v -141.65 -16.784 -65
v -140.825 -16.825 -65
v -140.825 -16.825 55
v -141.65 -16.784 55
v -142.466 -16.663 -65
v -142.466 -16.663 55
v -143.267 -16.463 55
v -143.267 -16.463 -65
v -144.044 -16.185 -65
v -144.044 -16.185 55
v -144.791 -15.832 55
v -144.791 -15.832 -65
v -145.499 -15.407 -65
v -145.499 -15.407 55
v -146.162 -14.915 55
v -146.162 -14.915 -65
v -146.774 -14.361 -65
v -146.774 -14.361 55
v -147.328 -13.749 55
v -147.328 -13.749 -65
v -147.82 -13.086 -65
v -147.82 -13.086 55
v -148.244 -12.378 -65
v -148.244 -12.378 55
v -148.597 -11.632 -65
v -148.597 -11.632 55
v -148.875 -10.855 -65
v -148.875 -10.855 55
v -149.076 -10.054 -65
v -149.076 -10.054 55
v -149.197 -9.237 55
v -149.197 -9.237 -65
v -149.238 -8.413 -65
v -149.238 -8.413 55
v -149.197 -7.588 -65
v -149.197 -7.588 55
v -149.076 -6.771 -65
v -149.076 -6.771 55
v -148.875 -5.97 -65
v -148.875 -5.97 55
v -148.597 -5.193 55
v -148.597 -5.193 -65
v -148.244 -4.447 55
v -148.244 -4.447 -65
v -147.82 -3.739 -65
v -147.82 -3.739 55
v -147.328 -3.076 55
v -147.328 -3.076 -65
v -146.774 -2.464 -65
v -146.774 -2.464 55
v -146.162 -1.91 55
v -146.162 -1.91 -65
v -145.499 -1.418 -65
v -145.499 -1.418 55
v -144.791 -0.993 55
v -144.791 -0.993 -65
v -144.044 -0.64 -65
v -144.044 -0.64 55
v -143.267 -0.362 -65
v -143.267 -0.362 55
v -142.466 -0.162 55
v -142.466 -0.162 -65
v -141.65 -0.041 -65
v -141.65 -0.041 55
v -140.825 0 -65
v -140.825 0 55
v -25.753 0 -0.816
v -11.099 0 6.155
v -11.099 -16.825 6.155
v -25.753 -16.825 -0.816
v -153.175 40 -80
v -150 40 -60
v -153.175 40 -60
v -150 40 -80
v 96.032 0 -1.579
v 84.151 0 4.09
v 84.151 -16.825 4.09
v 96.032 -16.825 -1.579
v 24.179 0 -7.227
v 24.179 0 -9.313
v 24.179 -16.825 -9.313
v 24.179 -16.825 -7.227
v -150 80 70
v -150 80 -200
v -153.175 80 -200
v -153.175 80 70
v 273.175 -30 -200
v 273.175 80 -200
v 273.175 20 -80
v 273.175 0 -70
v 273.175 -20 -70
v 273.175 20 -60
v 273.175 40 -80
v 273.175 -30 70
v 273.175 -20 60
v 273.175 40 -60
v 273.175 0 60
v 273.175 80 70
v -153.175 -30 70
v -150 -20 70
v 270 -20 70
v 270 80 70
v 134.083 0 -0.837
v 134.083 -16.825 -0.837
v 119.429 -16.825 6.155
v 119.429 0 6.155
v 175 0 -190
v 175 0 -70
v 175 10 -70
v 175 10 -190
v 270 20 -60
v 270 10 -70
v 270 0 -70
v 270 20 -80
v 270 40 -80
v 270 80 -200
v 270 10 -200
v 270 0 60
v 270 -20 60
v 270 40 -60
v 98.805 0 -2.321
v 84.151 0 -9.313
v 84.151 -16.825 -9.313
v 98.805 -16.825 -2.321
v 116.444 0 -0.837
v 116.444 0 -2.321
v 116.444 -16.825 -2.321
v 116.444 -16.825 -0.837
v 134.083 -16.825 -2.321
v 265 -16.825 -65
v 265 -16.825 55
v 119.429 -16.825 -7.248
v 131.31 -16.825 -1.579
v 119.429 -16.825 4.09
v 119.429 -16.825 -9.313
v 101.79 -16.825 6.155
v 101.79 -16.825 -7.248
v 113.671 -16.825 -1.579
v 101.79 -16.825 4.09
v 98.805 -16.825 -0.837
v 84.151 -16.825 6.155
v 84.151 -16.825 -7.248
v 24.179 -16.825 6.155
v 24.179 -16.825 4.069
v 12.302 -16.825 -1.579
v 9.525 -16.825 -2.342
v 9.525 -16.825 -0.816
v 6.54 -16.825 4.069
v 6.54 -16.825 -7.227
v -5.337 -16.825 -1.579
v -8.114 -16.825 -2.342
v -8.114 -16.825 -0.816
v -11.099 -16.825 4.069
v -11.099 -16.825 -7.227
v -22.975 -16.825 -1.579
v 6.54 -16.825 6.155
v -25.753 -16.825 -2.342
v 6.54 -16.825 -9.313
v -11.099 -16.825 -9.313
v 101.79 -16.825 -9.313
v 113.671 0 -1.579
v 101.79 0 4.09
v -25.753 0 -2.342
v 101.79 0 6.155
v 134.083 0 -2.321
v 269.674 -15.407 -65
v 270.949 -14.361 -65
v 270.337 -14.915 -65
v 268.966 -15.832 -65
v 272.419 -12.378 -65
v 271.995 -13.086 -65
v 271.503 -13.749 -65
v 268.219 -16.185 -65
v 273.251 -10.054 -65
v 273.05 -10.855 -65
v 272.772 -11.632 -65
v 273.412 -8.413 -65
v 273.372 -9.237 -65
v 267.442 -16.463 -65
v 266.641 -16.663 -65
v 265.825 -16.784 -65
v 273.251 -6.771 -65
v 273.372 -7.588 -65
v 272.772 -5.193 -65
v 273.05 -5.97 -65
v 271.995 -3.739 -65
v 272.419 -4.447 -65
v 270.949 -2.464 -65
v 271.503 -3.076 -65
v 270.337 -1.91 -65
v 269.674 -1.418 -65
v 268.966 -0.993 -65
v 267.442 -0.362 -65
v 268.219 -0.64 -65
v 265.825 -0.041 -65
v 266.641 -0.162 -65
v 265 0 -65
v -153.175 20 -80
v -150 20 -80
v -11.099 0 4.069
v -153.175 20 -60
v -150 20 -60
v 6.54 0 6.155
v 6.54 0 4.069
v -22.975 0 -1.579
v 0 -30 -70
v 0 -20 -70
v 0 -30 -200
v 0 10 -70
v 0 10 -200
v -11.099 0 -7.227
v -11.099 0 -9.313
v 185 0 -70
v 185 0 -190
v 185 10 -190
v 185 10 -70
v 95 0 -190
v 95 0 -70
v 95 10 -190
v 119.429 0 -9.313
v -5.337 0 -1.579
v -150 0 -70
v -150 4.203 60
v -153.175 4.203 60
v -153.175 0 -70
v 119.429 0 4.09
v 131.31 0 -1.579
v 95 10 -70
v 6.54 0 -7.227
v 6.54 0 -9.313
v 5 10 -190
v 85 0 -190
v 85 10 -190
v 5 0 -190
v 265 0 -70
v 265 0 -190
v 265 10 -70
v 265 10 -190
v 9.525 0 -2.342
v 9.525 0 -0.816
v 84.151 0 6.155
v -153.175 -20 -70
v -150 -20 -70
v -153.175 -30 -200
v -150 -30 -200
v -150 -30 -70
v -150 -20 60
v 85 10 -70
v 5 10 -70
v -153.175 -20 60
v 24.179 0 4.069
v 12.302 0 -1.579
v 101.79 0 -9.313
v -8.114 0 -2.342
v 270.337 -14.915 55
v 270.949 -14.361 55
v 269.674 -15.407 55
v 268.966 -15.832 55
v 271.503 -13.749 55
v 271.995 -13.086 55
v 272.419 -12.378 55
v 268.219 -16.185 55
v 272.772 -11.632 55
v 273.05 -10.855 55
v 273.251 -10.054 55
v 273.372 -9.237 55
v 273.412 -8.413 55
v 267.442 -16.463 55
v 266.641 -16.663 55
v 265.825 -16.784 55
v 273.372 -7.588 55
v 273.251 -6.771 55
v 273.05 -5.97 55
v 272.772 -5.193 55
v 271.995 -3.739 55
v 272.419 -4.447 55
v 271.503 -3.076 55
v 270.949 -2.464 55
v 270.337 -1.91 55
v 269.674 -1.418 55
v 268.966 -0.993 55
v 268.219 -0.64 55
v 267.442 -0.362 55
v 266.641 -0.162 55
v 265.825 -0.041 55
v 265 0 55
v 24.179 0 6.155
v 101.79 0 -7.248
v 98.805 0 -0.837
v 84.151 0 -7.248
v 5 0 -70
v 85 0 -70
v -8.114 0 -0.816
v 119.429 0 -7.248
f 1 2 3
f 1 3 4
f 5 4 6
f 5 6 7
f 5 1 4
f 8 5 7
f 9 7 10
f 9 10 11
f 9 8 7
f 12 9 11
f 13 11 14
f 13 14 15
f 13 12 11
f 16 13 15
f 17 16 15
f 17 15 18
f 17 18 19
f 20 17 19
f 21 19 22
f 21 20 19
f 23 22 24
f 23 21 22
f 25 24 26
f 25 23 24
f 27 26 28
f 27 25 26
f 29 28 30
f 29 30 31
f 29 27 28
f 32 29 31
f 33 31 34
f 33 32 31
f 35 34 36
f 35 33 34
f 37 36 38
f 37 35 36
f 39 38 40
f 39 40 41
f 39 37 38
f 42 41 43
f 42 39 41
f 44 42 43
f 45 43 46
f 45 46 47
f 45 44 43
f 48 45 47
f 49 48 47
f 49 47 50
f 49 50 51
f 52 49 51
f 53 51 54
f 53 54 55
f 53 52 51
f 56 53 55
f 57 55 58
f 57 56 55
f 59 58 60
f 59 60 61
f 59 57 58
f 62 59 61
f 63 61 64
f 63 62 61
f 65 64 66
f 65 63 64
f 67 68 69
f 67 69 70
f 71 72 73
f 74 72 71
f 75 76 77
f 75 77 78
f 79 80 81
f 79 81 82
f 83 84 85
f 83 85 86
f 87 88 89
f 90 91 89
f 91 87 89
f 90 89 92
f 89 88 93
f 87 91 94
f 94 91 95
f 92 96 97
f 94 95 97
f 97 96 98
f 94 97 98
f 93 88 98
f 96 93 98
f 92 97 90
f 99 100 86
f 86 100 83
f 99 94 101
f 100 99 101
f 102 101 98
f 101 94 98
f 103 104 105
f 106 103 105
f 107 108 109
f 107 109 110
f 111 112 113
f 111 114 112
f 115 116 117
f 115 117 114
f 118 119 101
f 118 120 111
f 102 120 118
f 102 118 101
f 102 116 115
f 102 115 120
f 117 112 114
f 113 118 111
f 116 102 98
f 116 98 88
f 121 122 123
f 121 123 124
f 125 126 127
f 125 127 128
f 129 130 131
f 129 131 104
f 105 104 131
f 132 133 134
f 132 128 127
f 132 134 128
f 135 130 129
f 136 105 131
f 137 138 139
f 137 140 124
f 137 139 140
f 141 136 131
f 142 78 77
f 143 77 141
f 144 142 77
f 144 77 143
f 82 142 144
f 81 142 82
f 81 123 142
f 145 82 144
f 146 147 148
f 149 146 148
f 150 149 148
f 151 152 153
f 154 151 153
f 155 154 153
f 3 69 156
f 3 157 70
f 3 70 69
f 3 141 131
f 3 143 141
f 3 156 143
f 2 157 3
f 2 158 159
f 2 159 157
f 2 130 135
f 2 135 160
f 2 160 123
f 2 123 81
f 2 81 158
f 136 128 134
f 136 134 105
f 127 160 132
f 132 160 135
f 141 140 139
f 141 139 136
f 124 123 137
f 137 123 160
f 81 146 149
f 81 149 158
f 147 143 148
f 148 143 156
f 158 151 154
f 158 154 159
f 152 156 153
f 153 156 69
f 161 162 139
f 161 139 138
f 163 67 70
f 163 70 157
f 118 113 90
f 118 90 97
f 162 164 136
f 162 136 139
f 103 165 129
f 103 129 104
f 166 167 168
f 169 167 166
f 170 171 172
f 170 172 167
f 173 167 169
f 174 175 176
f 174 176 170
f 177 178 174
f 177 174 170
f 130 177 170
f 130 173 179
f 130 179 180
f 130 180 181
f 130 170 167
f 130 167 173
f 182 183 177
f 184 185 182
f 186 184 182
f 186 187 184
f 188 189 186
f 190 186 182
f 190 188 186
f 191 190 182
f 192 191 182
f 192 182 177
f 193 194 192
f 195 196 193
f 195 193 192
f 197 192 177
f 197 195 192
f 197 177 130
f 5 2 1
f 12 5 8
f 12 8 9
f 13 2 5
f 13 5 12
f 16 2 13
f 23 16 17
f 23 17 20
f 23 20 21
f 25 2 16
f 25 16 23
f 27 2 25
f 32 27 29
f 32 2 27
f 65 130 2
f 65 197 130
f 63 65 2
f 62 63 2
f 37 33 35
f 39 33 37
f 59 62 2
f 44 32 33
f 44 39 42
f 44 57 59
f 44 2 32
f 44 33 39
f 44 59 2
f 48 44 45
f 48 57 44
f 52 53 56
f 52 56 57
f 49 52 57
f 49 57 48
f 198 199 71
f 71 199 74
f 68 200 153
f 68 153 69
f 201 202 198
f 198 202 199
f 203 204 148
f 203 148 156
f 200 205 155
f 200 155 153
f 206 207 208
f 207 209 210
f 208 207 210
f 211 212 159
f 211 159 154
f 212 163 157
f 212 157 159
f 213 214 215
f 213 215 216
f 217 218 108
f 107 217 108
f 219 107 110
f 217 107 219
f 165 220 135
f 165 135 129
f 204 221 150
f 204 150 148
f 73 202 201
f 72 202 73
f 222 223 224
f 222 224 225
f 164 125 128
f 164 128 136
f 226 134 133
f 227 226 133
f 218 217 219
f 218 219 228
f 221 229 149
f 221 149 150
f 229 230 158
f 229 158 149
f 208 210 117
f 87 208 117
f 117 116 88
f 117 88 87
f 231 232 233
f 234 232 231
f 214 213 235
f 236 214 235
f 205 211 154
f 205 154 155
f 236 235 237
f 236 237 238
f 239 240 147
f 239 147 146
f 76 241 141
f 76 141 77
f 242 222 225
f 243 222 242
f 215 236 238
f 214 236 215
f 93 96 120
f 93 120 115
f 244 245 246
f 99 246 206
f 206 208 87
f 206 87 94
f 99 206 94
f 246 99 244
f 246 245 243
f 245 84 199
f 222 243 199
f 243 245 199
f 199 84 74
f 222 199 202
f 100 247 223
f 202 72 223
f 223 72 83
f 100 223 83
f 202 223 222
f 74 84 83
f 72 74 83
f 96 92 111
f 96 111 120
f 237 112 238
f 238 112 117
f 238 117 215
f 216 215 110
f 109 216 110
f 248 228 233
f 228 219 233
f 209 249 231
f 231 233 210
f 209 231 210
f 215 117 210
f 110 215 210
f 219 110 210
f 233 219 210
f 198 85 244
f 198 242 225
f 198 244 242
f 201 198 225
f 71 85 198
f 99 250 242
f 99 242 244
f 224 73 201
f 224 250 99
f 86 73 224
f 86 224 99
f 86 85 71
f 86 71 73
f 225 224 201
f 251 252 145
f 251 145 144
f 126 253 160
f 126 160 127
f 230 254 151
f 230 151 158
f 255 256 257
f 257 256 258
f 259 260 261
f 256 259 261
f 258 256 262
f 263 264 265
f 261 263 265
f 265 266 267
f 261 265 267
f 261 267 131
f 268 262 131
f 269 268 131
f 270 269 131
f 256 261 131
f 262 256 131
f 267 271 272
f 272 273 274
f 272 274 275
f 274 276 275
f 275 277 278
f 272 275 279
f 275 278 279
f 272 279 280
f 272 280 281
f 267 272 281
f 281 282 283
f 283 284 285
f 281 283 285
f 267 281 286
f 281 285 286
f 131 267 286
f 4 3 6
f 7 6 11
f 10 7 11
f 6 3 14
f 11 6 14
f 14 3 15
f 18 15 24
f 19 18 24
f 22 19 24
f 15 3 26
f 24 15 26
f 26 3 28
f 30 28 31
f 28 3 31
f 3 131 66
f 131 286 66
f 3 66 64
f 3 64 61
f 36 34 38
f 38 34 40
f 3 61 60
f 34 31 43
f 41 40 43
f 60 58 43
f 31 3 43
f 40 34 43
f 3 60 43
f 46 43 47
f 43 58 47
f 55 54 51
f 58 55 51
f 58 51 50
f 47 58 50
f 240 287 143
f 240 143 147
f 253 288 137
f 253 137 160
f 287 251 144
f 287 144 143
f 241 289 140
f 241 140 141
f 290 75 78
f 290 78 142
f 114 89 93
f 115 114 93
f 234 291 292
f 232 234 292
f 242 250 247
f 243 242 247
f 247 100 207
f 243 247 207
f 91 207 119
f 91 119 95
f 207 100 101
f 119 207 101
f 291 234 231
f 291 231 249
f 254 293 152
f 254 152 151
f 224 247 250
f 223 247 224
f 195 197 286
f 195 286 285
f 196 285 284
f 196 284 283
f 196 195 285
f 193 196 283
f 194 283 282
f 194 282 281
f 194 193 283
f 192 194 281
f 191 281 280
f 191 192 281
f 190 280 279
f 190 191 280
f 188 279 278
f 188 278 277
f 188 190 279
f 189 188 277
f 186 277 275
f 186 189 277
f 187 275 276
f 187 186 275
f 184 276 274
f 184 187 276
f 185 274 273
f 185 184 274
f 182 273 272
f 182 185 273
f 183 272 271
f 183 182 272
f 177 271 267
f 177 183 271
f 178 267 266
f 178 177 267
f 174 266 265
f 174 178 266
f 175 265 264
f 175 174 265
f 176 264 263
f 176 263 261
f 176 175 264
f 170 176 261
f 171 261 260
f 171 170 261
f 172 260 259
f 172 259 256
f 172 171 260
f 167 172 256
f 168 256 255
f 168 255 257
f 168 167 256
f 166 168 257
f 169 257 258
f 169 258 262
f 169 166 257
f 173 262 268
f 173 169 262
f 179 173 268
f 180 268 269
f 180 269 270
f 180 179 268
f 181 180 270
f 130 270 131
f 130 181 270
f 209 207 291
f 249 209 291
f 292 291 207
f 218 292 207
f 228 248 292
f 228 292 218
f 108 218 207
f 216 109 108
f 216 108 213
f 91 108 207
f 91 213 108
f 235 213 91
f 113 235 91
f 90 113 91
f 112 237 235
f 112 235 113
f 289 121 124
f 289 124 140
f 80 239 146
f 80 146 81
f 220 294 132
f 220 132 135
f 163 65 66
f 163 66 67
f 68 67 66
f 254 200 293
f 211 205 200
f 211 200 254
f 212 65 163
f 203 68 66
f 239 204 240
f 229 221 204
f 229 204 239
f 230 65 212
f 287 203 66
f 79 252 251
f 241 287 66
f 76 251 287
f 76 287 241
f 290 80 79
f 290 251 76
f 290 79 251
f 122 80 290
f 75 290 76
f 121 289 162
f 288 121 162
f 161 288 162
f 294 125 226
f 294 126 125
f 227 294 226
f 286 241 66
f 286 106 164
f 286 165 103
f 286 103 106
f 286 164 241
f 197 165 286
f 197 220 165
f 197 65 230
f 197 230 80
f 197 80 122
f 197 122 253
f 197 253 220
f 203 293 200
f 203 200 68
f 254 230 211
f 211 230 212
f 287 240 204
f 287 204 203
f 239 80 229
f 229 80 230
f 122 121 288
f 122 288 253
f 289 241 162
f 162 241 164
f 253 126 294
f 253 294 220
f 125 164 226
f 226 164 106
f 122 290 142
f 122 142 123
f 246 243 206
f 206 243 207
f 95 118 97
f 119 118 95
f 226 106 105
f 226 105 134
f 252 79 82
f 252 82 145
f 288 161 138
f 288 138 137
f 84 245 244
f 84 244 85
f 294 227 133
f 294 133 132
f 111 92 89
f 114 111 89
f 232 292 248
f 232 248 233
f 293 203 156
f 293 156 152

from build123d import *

# Parameters (mm, degrees)
PARKING_DEPTH       = 10
PARKINGS_COUNT      = 3
PARKINGS_PITCH      = 90
RIGHTWALL_DEPTH     = 3.175
SKETCH5_W           = 270
SKETCH5_H           = 130
PARKINGBOTTOM_DEPTH = 20
BELT_DEPTH          = 120
SIGN_DEPTH          = 16.825
FLOORBASE_DEPTH     = 10
SKETCH19_W          = 270
SKETCH19_H          = 110
LEFTWALL_DEPTH      = 3.175
SKETCH2_W           = 20
SKETCH2_H           = 20
LASERHOLE_DEPTH     = 426.35


with BuildPart() as part:
    # SingleLot → Parking (new body)
    with BuildSketch(Plane(origin=(0, 0, 0), x_dir=(1, 0, 0), z_dir=(0, 1, 0))):
        Polygon((5, 70), (0, 70), (0, 200), (90, 200), (90, 70), (85, 70), (85, 190), (5, 190), align=None)
    parking = extrude(amount=PARKING_DEPTH)

    # Parkings: Parking ×3
    with Locations(*[(i * PARKINGS_PITCH, 0, 0) for i in range(1, PARKINGS_COUNT)]):
        add(parking)

    # Wall → RightWall (add)
    with BuildSketch(Plane(origin=(270, 0, 0), x_dir=(0, 0, -1), z_dir=(1, 0, 0))):
        Polygon((-70, 80), (200, 80), (200, 0), (200, -20), (70, -20), (70, 0), (-60, 0), (-60, -20), (-70, -20), align=None)
    extrude(amount=RIGHTWALL_DEPTH)

    # Sketch5 → ParkingBottom (add)
    with BuildSketch(Plane.XZ):
        with Locations((135, -135)):
            Rectangle(SKETCH5_W, SKETCH5_H)
    extrude(amount=PARKINGBOTTOM_DEPTH)

    # Sketch17 → FloorBase (add)
    with BuildSketch(Plane.XZ.offset(20)):
        Polygon((0, -200), (273.175, -200), (273.175, 70), (-150, 70), (-150, -70), (0, -70), align=None)
    extrude(amount=FLOORBASE_DEPTH)

    # Sketch19 → LeftWall (add)
    with BuildSketch(Plane.ZY.offset(150)):
        with Locations((-65, 25)):
            Rectangle(SKETCH19_W, SKETCH19_H)
        Polygon((60, -20), (60, 4.202967169), (-70, 0), (-70, -20), align=None, mode=Mode.SUBTRACT)
    extrude(amount=LEFTWALL_DEPTH)

    # Sketch2 → LaserHole (cut)
    with BuildSketch(Plane(origin=(273.175, 0, 0), x_dir=(0, 0, -1), z_dir=(1, 0, 0))):
        with Locations((70, 30)):
            Rectangle(SKETCH2_W, SKETCH2_H)
    extrude(amount=-LASERHOLE_DEPTH, mode=Mode.SUBTRACT)


with BuildPart() as body_2:
    # Sketch15 → Belt (new body)
    with BuildSketch(Plane.XY.offset(-65)):
        with BuildLine():
            Line((-140.825, 0), (265, 0))
            ThreePointArc((265, 0), (273.4125, -8.4125), (265, -16.825))
            Line((265, -16.825), (-140.825, -16.825))
            ThreePointArc((-140.825, -16.825), (-149.2375, -8.4125), (-140.825, 0))
        make_face()
    extrude(amount=BELT_DEPTH)

    # Sketch16 → <<>>Sign (cut)
    with BuildSketch(Plane(origin=(0, 0, 0), x_dir=(1, 0, 0), z_dir=(0, 1, 0))):
        Polygon((-11.098872594, -4.068968491), (-11.098872594, -6.155106312), (-25.752718748, 0.815646893), (-25.752718748, 2.342089201), (-11.098872594, 9.312842406), (-11.098872594, 7.226704586), (-22.975441771, 1.578868047), align=None)
        Polygon((6.540016295, -4.068968491), (6.540016295, -6.155106312), (-8.113829859, 0.815646893), (-8.113829859, 2.342089201), (6.540016295, 9.312842406), (6.540016295, 7.226704586), (-5.336552882, 1.578868047), align=None)
        Polygon((24.178905184, -4.068968491), (24.178905184, -6.155106312), (9.52505903, 0.815646893), (9.52505903, 2.342089201), (24.178905184, 9.312842406), (24.178905184, 7.226704586), (12.302336007, 1.578868047), align=None)
        Polygon((84.151127406, -4.090169079), (96.031936701, 1.578868047), (84.151127406, 7.247905173), (84.151127406, 9.312842406), (98.80497356, 2.320888613), (98.80497356, 0.836847481), (84.151127406, -6.155106312), align=None)
        Polygon((101.790016295, -4.090169079), (113.67082559, 1.578868047), (101.790016295, 7.247905173), (101.790016295, 9.312842406), (116.443862449, 2.320888613), (116.443862449, 0.836847481), (101.790016295, -6.155106312), align=None)
        Polygon((119.428905184, -4.090169079), (131.309714479, 1.578868047), (119.428905184, 7.247905173), (119.428905184, 9.312842406), (134.082751338, 2.320888613), (134.082751338, 0.836847481), (119.428905184, -6.155106312), align=None)
    extrude(amount=-SIGN_DEPTH, mode=Mode.SUBTRACT)


solid = Compound([part.part, body_2.part])
